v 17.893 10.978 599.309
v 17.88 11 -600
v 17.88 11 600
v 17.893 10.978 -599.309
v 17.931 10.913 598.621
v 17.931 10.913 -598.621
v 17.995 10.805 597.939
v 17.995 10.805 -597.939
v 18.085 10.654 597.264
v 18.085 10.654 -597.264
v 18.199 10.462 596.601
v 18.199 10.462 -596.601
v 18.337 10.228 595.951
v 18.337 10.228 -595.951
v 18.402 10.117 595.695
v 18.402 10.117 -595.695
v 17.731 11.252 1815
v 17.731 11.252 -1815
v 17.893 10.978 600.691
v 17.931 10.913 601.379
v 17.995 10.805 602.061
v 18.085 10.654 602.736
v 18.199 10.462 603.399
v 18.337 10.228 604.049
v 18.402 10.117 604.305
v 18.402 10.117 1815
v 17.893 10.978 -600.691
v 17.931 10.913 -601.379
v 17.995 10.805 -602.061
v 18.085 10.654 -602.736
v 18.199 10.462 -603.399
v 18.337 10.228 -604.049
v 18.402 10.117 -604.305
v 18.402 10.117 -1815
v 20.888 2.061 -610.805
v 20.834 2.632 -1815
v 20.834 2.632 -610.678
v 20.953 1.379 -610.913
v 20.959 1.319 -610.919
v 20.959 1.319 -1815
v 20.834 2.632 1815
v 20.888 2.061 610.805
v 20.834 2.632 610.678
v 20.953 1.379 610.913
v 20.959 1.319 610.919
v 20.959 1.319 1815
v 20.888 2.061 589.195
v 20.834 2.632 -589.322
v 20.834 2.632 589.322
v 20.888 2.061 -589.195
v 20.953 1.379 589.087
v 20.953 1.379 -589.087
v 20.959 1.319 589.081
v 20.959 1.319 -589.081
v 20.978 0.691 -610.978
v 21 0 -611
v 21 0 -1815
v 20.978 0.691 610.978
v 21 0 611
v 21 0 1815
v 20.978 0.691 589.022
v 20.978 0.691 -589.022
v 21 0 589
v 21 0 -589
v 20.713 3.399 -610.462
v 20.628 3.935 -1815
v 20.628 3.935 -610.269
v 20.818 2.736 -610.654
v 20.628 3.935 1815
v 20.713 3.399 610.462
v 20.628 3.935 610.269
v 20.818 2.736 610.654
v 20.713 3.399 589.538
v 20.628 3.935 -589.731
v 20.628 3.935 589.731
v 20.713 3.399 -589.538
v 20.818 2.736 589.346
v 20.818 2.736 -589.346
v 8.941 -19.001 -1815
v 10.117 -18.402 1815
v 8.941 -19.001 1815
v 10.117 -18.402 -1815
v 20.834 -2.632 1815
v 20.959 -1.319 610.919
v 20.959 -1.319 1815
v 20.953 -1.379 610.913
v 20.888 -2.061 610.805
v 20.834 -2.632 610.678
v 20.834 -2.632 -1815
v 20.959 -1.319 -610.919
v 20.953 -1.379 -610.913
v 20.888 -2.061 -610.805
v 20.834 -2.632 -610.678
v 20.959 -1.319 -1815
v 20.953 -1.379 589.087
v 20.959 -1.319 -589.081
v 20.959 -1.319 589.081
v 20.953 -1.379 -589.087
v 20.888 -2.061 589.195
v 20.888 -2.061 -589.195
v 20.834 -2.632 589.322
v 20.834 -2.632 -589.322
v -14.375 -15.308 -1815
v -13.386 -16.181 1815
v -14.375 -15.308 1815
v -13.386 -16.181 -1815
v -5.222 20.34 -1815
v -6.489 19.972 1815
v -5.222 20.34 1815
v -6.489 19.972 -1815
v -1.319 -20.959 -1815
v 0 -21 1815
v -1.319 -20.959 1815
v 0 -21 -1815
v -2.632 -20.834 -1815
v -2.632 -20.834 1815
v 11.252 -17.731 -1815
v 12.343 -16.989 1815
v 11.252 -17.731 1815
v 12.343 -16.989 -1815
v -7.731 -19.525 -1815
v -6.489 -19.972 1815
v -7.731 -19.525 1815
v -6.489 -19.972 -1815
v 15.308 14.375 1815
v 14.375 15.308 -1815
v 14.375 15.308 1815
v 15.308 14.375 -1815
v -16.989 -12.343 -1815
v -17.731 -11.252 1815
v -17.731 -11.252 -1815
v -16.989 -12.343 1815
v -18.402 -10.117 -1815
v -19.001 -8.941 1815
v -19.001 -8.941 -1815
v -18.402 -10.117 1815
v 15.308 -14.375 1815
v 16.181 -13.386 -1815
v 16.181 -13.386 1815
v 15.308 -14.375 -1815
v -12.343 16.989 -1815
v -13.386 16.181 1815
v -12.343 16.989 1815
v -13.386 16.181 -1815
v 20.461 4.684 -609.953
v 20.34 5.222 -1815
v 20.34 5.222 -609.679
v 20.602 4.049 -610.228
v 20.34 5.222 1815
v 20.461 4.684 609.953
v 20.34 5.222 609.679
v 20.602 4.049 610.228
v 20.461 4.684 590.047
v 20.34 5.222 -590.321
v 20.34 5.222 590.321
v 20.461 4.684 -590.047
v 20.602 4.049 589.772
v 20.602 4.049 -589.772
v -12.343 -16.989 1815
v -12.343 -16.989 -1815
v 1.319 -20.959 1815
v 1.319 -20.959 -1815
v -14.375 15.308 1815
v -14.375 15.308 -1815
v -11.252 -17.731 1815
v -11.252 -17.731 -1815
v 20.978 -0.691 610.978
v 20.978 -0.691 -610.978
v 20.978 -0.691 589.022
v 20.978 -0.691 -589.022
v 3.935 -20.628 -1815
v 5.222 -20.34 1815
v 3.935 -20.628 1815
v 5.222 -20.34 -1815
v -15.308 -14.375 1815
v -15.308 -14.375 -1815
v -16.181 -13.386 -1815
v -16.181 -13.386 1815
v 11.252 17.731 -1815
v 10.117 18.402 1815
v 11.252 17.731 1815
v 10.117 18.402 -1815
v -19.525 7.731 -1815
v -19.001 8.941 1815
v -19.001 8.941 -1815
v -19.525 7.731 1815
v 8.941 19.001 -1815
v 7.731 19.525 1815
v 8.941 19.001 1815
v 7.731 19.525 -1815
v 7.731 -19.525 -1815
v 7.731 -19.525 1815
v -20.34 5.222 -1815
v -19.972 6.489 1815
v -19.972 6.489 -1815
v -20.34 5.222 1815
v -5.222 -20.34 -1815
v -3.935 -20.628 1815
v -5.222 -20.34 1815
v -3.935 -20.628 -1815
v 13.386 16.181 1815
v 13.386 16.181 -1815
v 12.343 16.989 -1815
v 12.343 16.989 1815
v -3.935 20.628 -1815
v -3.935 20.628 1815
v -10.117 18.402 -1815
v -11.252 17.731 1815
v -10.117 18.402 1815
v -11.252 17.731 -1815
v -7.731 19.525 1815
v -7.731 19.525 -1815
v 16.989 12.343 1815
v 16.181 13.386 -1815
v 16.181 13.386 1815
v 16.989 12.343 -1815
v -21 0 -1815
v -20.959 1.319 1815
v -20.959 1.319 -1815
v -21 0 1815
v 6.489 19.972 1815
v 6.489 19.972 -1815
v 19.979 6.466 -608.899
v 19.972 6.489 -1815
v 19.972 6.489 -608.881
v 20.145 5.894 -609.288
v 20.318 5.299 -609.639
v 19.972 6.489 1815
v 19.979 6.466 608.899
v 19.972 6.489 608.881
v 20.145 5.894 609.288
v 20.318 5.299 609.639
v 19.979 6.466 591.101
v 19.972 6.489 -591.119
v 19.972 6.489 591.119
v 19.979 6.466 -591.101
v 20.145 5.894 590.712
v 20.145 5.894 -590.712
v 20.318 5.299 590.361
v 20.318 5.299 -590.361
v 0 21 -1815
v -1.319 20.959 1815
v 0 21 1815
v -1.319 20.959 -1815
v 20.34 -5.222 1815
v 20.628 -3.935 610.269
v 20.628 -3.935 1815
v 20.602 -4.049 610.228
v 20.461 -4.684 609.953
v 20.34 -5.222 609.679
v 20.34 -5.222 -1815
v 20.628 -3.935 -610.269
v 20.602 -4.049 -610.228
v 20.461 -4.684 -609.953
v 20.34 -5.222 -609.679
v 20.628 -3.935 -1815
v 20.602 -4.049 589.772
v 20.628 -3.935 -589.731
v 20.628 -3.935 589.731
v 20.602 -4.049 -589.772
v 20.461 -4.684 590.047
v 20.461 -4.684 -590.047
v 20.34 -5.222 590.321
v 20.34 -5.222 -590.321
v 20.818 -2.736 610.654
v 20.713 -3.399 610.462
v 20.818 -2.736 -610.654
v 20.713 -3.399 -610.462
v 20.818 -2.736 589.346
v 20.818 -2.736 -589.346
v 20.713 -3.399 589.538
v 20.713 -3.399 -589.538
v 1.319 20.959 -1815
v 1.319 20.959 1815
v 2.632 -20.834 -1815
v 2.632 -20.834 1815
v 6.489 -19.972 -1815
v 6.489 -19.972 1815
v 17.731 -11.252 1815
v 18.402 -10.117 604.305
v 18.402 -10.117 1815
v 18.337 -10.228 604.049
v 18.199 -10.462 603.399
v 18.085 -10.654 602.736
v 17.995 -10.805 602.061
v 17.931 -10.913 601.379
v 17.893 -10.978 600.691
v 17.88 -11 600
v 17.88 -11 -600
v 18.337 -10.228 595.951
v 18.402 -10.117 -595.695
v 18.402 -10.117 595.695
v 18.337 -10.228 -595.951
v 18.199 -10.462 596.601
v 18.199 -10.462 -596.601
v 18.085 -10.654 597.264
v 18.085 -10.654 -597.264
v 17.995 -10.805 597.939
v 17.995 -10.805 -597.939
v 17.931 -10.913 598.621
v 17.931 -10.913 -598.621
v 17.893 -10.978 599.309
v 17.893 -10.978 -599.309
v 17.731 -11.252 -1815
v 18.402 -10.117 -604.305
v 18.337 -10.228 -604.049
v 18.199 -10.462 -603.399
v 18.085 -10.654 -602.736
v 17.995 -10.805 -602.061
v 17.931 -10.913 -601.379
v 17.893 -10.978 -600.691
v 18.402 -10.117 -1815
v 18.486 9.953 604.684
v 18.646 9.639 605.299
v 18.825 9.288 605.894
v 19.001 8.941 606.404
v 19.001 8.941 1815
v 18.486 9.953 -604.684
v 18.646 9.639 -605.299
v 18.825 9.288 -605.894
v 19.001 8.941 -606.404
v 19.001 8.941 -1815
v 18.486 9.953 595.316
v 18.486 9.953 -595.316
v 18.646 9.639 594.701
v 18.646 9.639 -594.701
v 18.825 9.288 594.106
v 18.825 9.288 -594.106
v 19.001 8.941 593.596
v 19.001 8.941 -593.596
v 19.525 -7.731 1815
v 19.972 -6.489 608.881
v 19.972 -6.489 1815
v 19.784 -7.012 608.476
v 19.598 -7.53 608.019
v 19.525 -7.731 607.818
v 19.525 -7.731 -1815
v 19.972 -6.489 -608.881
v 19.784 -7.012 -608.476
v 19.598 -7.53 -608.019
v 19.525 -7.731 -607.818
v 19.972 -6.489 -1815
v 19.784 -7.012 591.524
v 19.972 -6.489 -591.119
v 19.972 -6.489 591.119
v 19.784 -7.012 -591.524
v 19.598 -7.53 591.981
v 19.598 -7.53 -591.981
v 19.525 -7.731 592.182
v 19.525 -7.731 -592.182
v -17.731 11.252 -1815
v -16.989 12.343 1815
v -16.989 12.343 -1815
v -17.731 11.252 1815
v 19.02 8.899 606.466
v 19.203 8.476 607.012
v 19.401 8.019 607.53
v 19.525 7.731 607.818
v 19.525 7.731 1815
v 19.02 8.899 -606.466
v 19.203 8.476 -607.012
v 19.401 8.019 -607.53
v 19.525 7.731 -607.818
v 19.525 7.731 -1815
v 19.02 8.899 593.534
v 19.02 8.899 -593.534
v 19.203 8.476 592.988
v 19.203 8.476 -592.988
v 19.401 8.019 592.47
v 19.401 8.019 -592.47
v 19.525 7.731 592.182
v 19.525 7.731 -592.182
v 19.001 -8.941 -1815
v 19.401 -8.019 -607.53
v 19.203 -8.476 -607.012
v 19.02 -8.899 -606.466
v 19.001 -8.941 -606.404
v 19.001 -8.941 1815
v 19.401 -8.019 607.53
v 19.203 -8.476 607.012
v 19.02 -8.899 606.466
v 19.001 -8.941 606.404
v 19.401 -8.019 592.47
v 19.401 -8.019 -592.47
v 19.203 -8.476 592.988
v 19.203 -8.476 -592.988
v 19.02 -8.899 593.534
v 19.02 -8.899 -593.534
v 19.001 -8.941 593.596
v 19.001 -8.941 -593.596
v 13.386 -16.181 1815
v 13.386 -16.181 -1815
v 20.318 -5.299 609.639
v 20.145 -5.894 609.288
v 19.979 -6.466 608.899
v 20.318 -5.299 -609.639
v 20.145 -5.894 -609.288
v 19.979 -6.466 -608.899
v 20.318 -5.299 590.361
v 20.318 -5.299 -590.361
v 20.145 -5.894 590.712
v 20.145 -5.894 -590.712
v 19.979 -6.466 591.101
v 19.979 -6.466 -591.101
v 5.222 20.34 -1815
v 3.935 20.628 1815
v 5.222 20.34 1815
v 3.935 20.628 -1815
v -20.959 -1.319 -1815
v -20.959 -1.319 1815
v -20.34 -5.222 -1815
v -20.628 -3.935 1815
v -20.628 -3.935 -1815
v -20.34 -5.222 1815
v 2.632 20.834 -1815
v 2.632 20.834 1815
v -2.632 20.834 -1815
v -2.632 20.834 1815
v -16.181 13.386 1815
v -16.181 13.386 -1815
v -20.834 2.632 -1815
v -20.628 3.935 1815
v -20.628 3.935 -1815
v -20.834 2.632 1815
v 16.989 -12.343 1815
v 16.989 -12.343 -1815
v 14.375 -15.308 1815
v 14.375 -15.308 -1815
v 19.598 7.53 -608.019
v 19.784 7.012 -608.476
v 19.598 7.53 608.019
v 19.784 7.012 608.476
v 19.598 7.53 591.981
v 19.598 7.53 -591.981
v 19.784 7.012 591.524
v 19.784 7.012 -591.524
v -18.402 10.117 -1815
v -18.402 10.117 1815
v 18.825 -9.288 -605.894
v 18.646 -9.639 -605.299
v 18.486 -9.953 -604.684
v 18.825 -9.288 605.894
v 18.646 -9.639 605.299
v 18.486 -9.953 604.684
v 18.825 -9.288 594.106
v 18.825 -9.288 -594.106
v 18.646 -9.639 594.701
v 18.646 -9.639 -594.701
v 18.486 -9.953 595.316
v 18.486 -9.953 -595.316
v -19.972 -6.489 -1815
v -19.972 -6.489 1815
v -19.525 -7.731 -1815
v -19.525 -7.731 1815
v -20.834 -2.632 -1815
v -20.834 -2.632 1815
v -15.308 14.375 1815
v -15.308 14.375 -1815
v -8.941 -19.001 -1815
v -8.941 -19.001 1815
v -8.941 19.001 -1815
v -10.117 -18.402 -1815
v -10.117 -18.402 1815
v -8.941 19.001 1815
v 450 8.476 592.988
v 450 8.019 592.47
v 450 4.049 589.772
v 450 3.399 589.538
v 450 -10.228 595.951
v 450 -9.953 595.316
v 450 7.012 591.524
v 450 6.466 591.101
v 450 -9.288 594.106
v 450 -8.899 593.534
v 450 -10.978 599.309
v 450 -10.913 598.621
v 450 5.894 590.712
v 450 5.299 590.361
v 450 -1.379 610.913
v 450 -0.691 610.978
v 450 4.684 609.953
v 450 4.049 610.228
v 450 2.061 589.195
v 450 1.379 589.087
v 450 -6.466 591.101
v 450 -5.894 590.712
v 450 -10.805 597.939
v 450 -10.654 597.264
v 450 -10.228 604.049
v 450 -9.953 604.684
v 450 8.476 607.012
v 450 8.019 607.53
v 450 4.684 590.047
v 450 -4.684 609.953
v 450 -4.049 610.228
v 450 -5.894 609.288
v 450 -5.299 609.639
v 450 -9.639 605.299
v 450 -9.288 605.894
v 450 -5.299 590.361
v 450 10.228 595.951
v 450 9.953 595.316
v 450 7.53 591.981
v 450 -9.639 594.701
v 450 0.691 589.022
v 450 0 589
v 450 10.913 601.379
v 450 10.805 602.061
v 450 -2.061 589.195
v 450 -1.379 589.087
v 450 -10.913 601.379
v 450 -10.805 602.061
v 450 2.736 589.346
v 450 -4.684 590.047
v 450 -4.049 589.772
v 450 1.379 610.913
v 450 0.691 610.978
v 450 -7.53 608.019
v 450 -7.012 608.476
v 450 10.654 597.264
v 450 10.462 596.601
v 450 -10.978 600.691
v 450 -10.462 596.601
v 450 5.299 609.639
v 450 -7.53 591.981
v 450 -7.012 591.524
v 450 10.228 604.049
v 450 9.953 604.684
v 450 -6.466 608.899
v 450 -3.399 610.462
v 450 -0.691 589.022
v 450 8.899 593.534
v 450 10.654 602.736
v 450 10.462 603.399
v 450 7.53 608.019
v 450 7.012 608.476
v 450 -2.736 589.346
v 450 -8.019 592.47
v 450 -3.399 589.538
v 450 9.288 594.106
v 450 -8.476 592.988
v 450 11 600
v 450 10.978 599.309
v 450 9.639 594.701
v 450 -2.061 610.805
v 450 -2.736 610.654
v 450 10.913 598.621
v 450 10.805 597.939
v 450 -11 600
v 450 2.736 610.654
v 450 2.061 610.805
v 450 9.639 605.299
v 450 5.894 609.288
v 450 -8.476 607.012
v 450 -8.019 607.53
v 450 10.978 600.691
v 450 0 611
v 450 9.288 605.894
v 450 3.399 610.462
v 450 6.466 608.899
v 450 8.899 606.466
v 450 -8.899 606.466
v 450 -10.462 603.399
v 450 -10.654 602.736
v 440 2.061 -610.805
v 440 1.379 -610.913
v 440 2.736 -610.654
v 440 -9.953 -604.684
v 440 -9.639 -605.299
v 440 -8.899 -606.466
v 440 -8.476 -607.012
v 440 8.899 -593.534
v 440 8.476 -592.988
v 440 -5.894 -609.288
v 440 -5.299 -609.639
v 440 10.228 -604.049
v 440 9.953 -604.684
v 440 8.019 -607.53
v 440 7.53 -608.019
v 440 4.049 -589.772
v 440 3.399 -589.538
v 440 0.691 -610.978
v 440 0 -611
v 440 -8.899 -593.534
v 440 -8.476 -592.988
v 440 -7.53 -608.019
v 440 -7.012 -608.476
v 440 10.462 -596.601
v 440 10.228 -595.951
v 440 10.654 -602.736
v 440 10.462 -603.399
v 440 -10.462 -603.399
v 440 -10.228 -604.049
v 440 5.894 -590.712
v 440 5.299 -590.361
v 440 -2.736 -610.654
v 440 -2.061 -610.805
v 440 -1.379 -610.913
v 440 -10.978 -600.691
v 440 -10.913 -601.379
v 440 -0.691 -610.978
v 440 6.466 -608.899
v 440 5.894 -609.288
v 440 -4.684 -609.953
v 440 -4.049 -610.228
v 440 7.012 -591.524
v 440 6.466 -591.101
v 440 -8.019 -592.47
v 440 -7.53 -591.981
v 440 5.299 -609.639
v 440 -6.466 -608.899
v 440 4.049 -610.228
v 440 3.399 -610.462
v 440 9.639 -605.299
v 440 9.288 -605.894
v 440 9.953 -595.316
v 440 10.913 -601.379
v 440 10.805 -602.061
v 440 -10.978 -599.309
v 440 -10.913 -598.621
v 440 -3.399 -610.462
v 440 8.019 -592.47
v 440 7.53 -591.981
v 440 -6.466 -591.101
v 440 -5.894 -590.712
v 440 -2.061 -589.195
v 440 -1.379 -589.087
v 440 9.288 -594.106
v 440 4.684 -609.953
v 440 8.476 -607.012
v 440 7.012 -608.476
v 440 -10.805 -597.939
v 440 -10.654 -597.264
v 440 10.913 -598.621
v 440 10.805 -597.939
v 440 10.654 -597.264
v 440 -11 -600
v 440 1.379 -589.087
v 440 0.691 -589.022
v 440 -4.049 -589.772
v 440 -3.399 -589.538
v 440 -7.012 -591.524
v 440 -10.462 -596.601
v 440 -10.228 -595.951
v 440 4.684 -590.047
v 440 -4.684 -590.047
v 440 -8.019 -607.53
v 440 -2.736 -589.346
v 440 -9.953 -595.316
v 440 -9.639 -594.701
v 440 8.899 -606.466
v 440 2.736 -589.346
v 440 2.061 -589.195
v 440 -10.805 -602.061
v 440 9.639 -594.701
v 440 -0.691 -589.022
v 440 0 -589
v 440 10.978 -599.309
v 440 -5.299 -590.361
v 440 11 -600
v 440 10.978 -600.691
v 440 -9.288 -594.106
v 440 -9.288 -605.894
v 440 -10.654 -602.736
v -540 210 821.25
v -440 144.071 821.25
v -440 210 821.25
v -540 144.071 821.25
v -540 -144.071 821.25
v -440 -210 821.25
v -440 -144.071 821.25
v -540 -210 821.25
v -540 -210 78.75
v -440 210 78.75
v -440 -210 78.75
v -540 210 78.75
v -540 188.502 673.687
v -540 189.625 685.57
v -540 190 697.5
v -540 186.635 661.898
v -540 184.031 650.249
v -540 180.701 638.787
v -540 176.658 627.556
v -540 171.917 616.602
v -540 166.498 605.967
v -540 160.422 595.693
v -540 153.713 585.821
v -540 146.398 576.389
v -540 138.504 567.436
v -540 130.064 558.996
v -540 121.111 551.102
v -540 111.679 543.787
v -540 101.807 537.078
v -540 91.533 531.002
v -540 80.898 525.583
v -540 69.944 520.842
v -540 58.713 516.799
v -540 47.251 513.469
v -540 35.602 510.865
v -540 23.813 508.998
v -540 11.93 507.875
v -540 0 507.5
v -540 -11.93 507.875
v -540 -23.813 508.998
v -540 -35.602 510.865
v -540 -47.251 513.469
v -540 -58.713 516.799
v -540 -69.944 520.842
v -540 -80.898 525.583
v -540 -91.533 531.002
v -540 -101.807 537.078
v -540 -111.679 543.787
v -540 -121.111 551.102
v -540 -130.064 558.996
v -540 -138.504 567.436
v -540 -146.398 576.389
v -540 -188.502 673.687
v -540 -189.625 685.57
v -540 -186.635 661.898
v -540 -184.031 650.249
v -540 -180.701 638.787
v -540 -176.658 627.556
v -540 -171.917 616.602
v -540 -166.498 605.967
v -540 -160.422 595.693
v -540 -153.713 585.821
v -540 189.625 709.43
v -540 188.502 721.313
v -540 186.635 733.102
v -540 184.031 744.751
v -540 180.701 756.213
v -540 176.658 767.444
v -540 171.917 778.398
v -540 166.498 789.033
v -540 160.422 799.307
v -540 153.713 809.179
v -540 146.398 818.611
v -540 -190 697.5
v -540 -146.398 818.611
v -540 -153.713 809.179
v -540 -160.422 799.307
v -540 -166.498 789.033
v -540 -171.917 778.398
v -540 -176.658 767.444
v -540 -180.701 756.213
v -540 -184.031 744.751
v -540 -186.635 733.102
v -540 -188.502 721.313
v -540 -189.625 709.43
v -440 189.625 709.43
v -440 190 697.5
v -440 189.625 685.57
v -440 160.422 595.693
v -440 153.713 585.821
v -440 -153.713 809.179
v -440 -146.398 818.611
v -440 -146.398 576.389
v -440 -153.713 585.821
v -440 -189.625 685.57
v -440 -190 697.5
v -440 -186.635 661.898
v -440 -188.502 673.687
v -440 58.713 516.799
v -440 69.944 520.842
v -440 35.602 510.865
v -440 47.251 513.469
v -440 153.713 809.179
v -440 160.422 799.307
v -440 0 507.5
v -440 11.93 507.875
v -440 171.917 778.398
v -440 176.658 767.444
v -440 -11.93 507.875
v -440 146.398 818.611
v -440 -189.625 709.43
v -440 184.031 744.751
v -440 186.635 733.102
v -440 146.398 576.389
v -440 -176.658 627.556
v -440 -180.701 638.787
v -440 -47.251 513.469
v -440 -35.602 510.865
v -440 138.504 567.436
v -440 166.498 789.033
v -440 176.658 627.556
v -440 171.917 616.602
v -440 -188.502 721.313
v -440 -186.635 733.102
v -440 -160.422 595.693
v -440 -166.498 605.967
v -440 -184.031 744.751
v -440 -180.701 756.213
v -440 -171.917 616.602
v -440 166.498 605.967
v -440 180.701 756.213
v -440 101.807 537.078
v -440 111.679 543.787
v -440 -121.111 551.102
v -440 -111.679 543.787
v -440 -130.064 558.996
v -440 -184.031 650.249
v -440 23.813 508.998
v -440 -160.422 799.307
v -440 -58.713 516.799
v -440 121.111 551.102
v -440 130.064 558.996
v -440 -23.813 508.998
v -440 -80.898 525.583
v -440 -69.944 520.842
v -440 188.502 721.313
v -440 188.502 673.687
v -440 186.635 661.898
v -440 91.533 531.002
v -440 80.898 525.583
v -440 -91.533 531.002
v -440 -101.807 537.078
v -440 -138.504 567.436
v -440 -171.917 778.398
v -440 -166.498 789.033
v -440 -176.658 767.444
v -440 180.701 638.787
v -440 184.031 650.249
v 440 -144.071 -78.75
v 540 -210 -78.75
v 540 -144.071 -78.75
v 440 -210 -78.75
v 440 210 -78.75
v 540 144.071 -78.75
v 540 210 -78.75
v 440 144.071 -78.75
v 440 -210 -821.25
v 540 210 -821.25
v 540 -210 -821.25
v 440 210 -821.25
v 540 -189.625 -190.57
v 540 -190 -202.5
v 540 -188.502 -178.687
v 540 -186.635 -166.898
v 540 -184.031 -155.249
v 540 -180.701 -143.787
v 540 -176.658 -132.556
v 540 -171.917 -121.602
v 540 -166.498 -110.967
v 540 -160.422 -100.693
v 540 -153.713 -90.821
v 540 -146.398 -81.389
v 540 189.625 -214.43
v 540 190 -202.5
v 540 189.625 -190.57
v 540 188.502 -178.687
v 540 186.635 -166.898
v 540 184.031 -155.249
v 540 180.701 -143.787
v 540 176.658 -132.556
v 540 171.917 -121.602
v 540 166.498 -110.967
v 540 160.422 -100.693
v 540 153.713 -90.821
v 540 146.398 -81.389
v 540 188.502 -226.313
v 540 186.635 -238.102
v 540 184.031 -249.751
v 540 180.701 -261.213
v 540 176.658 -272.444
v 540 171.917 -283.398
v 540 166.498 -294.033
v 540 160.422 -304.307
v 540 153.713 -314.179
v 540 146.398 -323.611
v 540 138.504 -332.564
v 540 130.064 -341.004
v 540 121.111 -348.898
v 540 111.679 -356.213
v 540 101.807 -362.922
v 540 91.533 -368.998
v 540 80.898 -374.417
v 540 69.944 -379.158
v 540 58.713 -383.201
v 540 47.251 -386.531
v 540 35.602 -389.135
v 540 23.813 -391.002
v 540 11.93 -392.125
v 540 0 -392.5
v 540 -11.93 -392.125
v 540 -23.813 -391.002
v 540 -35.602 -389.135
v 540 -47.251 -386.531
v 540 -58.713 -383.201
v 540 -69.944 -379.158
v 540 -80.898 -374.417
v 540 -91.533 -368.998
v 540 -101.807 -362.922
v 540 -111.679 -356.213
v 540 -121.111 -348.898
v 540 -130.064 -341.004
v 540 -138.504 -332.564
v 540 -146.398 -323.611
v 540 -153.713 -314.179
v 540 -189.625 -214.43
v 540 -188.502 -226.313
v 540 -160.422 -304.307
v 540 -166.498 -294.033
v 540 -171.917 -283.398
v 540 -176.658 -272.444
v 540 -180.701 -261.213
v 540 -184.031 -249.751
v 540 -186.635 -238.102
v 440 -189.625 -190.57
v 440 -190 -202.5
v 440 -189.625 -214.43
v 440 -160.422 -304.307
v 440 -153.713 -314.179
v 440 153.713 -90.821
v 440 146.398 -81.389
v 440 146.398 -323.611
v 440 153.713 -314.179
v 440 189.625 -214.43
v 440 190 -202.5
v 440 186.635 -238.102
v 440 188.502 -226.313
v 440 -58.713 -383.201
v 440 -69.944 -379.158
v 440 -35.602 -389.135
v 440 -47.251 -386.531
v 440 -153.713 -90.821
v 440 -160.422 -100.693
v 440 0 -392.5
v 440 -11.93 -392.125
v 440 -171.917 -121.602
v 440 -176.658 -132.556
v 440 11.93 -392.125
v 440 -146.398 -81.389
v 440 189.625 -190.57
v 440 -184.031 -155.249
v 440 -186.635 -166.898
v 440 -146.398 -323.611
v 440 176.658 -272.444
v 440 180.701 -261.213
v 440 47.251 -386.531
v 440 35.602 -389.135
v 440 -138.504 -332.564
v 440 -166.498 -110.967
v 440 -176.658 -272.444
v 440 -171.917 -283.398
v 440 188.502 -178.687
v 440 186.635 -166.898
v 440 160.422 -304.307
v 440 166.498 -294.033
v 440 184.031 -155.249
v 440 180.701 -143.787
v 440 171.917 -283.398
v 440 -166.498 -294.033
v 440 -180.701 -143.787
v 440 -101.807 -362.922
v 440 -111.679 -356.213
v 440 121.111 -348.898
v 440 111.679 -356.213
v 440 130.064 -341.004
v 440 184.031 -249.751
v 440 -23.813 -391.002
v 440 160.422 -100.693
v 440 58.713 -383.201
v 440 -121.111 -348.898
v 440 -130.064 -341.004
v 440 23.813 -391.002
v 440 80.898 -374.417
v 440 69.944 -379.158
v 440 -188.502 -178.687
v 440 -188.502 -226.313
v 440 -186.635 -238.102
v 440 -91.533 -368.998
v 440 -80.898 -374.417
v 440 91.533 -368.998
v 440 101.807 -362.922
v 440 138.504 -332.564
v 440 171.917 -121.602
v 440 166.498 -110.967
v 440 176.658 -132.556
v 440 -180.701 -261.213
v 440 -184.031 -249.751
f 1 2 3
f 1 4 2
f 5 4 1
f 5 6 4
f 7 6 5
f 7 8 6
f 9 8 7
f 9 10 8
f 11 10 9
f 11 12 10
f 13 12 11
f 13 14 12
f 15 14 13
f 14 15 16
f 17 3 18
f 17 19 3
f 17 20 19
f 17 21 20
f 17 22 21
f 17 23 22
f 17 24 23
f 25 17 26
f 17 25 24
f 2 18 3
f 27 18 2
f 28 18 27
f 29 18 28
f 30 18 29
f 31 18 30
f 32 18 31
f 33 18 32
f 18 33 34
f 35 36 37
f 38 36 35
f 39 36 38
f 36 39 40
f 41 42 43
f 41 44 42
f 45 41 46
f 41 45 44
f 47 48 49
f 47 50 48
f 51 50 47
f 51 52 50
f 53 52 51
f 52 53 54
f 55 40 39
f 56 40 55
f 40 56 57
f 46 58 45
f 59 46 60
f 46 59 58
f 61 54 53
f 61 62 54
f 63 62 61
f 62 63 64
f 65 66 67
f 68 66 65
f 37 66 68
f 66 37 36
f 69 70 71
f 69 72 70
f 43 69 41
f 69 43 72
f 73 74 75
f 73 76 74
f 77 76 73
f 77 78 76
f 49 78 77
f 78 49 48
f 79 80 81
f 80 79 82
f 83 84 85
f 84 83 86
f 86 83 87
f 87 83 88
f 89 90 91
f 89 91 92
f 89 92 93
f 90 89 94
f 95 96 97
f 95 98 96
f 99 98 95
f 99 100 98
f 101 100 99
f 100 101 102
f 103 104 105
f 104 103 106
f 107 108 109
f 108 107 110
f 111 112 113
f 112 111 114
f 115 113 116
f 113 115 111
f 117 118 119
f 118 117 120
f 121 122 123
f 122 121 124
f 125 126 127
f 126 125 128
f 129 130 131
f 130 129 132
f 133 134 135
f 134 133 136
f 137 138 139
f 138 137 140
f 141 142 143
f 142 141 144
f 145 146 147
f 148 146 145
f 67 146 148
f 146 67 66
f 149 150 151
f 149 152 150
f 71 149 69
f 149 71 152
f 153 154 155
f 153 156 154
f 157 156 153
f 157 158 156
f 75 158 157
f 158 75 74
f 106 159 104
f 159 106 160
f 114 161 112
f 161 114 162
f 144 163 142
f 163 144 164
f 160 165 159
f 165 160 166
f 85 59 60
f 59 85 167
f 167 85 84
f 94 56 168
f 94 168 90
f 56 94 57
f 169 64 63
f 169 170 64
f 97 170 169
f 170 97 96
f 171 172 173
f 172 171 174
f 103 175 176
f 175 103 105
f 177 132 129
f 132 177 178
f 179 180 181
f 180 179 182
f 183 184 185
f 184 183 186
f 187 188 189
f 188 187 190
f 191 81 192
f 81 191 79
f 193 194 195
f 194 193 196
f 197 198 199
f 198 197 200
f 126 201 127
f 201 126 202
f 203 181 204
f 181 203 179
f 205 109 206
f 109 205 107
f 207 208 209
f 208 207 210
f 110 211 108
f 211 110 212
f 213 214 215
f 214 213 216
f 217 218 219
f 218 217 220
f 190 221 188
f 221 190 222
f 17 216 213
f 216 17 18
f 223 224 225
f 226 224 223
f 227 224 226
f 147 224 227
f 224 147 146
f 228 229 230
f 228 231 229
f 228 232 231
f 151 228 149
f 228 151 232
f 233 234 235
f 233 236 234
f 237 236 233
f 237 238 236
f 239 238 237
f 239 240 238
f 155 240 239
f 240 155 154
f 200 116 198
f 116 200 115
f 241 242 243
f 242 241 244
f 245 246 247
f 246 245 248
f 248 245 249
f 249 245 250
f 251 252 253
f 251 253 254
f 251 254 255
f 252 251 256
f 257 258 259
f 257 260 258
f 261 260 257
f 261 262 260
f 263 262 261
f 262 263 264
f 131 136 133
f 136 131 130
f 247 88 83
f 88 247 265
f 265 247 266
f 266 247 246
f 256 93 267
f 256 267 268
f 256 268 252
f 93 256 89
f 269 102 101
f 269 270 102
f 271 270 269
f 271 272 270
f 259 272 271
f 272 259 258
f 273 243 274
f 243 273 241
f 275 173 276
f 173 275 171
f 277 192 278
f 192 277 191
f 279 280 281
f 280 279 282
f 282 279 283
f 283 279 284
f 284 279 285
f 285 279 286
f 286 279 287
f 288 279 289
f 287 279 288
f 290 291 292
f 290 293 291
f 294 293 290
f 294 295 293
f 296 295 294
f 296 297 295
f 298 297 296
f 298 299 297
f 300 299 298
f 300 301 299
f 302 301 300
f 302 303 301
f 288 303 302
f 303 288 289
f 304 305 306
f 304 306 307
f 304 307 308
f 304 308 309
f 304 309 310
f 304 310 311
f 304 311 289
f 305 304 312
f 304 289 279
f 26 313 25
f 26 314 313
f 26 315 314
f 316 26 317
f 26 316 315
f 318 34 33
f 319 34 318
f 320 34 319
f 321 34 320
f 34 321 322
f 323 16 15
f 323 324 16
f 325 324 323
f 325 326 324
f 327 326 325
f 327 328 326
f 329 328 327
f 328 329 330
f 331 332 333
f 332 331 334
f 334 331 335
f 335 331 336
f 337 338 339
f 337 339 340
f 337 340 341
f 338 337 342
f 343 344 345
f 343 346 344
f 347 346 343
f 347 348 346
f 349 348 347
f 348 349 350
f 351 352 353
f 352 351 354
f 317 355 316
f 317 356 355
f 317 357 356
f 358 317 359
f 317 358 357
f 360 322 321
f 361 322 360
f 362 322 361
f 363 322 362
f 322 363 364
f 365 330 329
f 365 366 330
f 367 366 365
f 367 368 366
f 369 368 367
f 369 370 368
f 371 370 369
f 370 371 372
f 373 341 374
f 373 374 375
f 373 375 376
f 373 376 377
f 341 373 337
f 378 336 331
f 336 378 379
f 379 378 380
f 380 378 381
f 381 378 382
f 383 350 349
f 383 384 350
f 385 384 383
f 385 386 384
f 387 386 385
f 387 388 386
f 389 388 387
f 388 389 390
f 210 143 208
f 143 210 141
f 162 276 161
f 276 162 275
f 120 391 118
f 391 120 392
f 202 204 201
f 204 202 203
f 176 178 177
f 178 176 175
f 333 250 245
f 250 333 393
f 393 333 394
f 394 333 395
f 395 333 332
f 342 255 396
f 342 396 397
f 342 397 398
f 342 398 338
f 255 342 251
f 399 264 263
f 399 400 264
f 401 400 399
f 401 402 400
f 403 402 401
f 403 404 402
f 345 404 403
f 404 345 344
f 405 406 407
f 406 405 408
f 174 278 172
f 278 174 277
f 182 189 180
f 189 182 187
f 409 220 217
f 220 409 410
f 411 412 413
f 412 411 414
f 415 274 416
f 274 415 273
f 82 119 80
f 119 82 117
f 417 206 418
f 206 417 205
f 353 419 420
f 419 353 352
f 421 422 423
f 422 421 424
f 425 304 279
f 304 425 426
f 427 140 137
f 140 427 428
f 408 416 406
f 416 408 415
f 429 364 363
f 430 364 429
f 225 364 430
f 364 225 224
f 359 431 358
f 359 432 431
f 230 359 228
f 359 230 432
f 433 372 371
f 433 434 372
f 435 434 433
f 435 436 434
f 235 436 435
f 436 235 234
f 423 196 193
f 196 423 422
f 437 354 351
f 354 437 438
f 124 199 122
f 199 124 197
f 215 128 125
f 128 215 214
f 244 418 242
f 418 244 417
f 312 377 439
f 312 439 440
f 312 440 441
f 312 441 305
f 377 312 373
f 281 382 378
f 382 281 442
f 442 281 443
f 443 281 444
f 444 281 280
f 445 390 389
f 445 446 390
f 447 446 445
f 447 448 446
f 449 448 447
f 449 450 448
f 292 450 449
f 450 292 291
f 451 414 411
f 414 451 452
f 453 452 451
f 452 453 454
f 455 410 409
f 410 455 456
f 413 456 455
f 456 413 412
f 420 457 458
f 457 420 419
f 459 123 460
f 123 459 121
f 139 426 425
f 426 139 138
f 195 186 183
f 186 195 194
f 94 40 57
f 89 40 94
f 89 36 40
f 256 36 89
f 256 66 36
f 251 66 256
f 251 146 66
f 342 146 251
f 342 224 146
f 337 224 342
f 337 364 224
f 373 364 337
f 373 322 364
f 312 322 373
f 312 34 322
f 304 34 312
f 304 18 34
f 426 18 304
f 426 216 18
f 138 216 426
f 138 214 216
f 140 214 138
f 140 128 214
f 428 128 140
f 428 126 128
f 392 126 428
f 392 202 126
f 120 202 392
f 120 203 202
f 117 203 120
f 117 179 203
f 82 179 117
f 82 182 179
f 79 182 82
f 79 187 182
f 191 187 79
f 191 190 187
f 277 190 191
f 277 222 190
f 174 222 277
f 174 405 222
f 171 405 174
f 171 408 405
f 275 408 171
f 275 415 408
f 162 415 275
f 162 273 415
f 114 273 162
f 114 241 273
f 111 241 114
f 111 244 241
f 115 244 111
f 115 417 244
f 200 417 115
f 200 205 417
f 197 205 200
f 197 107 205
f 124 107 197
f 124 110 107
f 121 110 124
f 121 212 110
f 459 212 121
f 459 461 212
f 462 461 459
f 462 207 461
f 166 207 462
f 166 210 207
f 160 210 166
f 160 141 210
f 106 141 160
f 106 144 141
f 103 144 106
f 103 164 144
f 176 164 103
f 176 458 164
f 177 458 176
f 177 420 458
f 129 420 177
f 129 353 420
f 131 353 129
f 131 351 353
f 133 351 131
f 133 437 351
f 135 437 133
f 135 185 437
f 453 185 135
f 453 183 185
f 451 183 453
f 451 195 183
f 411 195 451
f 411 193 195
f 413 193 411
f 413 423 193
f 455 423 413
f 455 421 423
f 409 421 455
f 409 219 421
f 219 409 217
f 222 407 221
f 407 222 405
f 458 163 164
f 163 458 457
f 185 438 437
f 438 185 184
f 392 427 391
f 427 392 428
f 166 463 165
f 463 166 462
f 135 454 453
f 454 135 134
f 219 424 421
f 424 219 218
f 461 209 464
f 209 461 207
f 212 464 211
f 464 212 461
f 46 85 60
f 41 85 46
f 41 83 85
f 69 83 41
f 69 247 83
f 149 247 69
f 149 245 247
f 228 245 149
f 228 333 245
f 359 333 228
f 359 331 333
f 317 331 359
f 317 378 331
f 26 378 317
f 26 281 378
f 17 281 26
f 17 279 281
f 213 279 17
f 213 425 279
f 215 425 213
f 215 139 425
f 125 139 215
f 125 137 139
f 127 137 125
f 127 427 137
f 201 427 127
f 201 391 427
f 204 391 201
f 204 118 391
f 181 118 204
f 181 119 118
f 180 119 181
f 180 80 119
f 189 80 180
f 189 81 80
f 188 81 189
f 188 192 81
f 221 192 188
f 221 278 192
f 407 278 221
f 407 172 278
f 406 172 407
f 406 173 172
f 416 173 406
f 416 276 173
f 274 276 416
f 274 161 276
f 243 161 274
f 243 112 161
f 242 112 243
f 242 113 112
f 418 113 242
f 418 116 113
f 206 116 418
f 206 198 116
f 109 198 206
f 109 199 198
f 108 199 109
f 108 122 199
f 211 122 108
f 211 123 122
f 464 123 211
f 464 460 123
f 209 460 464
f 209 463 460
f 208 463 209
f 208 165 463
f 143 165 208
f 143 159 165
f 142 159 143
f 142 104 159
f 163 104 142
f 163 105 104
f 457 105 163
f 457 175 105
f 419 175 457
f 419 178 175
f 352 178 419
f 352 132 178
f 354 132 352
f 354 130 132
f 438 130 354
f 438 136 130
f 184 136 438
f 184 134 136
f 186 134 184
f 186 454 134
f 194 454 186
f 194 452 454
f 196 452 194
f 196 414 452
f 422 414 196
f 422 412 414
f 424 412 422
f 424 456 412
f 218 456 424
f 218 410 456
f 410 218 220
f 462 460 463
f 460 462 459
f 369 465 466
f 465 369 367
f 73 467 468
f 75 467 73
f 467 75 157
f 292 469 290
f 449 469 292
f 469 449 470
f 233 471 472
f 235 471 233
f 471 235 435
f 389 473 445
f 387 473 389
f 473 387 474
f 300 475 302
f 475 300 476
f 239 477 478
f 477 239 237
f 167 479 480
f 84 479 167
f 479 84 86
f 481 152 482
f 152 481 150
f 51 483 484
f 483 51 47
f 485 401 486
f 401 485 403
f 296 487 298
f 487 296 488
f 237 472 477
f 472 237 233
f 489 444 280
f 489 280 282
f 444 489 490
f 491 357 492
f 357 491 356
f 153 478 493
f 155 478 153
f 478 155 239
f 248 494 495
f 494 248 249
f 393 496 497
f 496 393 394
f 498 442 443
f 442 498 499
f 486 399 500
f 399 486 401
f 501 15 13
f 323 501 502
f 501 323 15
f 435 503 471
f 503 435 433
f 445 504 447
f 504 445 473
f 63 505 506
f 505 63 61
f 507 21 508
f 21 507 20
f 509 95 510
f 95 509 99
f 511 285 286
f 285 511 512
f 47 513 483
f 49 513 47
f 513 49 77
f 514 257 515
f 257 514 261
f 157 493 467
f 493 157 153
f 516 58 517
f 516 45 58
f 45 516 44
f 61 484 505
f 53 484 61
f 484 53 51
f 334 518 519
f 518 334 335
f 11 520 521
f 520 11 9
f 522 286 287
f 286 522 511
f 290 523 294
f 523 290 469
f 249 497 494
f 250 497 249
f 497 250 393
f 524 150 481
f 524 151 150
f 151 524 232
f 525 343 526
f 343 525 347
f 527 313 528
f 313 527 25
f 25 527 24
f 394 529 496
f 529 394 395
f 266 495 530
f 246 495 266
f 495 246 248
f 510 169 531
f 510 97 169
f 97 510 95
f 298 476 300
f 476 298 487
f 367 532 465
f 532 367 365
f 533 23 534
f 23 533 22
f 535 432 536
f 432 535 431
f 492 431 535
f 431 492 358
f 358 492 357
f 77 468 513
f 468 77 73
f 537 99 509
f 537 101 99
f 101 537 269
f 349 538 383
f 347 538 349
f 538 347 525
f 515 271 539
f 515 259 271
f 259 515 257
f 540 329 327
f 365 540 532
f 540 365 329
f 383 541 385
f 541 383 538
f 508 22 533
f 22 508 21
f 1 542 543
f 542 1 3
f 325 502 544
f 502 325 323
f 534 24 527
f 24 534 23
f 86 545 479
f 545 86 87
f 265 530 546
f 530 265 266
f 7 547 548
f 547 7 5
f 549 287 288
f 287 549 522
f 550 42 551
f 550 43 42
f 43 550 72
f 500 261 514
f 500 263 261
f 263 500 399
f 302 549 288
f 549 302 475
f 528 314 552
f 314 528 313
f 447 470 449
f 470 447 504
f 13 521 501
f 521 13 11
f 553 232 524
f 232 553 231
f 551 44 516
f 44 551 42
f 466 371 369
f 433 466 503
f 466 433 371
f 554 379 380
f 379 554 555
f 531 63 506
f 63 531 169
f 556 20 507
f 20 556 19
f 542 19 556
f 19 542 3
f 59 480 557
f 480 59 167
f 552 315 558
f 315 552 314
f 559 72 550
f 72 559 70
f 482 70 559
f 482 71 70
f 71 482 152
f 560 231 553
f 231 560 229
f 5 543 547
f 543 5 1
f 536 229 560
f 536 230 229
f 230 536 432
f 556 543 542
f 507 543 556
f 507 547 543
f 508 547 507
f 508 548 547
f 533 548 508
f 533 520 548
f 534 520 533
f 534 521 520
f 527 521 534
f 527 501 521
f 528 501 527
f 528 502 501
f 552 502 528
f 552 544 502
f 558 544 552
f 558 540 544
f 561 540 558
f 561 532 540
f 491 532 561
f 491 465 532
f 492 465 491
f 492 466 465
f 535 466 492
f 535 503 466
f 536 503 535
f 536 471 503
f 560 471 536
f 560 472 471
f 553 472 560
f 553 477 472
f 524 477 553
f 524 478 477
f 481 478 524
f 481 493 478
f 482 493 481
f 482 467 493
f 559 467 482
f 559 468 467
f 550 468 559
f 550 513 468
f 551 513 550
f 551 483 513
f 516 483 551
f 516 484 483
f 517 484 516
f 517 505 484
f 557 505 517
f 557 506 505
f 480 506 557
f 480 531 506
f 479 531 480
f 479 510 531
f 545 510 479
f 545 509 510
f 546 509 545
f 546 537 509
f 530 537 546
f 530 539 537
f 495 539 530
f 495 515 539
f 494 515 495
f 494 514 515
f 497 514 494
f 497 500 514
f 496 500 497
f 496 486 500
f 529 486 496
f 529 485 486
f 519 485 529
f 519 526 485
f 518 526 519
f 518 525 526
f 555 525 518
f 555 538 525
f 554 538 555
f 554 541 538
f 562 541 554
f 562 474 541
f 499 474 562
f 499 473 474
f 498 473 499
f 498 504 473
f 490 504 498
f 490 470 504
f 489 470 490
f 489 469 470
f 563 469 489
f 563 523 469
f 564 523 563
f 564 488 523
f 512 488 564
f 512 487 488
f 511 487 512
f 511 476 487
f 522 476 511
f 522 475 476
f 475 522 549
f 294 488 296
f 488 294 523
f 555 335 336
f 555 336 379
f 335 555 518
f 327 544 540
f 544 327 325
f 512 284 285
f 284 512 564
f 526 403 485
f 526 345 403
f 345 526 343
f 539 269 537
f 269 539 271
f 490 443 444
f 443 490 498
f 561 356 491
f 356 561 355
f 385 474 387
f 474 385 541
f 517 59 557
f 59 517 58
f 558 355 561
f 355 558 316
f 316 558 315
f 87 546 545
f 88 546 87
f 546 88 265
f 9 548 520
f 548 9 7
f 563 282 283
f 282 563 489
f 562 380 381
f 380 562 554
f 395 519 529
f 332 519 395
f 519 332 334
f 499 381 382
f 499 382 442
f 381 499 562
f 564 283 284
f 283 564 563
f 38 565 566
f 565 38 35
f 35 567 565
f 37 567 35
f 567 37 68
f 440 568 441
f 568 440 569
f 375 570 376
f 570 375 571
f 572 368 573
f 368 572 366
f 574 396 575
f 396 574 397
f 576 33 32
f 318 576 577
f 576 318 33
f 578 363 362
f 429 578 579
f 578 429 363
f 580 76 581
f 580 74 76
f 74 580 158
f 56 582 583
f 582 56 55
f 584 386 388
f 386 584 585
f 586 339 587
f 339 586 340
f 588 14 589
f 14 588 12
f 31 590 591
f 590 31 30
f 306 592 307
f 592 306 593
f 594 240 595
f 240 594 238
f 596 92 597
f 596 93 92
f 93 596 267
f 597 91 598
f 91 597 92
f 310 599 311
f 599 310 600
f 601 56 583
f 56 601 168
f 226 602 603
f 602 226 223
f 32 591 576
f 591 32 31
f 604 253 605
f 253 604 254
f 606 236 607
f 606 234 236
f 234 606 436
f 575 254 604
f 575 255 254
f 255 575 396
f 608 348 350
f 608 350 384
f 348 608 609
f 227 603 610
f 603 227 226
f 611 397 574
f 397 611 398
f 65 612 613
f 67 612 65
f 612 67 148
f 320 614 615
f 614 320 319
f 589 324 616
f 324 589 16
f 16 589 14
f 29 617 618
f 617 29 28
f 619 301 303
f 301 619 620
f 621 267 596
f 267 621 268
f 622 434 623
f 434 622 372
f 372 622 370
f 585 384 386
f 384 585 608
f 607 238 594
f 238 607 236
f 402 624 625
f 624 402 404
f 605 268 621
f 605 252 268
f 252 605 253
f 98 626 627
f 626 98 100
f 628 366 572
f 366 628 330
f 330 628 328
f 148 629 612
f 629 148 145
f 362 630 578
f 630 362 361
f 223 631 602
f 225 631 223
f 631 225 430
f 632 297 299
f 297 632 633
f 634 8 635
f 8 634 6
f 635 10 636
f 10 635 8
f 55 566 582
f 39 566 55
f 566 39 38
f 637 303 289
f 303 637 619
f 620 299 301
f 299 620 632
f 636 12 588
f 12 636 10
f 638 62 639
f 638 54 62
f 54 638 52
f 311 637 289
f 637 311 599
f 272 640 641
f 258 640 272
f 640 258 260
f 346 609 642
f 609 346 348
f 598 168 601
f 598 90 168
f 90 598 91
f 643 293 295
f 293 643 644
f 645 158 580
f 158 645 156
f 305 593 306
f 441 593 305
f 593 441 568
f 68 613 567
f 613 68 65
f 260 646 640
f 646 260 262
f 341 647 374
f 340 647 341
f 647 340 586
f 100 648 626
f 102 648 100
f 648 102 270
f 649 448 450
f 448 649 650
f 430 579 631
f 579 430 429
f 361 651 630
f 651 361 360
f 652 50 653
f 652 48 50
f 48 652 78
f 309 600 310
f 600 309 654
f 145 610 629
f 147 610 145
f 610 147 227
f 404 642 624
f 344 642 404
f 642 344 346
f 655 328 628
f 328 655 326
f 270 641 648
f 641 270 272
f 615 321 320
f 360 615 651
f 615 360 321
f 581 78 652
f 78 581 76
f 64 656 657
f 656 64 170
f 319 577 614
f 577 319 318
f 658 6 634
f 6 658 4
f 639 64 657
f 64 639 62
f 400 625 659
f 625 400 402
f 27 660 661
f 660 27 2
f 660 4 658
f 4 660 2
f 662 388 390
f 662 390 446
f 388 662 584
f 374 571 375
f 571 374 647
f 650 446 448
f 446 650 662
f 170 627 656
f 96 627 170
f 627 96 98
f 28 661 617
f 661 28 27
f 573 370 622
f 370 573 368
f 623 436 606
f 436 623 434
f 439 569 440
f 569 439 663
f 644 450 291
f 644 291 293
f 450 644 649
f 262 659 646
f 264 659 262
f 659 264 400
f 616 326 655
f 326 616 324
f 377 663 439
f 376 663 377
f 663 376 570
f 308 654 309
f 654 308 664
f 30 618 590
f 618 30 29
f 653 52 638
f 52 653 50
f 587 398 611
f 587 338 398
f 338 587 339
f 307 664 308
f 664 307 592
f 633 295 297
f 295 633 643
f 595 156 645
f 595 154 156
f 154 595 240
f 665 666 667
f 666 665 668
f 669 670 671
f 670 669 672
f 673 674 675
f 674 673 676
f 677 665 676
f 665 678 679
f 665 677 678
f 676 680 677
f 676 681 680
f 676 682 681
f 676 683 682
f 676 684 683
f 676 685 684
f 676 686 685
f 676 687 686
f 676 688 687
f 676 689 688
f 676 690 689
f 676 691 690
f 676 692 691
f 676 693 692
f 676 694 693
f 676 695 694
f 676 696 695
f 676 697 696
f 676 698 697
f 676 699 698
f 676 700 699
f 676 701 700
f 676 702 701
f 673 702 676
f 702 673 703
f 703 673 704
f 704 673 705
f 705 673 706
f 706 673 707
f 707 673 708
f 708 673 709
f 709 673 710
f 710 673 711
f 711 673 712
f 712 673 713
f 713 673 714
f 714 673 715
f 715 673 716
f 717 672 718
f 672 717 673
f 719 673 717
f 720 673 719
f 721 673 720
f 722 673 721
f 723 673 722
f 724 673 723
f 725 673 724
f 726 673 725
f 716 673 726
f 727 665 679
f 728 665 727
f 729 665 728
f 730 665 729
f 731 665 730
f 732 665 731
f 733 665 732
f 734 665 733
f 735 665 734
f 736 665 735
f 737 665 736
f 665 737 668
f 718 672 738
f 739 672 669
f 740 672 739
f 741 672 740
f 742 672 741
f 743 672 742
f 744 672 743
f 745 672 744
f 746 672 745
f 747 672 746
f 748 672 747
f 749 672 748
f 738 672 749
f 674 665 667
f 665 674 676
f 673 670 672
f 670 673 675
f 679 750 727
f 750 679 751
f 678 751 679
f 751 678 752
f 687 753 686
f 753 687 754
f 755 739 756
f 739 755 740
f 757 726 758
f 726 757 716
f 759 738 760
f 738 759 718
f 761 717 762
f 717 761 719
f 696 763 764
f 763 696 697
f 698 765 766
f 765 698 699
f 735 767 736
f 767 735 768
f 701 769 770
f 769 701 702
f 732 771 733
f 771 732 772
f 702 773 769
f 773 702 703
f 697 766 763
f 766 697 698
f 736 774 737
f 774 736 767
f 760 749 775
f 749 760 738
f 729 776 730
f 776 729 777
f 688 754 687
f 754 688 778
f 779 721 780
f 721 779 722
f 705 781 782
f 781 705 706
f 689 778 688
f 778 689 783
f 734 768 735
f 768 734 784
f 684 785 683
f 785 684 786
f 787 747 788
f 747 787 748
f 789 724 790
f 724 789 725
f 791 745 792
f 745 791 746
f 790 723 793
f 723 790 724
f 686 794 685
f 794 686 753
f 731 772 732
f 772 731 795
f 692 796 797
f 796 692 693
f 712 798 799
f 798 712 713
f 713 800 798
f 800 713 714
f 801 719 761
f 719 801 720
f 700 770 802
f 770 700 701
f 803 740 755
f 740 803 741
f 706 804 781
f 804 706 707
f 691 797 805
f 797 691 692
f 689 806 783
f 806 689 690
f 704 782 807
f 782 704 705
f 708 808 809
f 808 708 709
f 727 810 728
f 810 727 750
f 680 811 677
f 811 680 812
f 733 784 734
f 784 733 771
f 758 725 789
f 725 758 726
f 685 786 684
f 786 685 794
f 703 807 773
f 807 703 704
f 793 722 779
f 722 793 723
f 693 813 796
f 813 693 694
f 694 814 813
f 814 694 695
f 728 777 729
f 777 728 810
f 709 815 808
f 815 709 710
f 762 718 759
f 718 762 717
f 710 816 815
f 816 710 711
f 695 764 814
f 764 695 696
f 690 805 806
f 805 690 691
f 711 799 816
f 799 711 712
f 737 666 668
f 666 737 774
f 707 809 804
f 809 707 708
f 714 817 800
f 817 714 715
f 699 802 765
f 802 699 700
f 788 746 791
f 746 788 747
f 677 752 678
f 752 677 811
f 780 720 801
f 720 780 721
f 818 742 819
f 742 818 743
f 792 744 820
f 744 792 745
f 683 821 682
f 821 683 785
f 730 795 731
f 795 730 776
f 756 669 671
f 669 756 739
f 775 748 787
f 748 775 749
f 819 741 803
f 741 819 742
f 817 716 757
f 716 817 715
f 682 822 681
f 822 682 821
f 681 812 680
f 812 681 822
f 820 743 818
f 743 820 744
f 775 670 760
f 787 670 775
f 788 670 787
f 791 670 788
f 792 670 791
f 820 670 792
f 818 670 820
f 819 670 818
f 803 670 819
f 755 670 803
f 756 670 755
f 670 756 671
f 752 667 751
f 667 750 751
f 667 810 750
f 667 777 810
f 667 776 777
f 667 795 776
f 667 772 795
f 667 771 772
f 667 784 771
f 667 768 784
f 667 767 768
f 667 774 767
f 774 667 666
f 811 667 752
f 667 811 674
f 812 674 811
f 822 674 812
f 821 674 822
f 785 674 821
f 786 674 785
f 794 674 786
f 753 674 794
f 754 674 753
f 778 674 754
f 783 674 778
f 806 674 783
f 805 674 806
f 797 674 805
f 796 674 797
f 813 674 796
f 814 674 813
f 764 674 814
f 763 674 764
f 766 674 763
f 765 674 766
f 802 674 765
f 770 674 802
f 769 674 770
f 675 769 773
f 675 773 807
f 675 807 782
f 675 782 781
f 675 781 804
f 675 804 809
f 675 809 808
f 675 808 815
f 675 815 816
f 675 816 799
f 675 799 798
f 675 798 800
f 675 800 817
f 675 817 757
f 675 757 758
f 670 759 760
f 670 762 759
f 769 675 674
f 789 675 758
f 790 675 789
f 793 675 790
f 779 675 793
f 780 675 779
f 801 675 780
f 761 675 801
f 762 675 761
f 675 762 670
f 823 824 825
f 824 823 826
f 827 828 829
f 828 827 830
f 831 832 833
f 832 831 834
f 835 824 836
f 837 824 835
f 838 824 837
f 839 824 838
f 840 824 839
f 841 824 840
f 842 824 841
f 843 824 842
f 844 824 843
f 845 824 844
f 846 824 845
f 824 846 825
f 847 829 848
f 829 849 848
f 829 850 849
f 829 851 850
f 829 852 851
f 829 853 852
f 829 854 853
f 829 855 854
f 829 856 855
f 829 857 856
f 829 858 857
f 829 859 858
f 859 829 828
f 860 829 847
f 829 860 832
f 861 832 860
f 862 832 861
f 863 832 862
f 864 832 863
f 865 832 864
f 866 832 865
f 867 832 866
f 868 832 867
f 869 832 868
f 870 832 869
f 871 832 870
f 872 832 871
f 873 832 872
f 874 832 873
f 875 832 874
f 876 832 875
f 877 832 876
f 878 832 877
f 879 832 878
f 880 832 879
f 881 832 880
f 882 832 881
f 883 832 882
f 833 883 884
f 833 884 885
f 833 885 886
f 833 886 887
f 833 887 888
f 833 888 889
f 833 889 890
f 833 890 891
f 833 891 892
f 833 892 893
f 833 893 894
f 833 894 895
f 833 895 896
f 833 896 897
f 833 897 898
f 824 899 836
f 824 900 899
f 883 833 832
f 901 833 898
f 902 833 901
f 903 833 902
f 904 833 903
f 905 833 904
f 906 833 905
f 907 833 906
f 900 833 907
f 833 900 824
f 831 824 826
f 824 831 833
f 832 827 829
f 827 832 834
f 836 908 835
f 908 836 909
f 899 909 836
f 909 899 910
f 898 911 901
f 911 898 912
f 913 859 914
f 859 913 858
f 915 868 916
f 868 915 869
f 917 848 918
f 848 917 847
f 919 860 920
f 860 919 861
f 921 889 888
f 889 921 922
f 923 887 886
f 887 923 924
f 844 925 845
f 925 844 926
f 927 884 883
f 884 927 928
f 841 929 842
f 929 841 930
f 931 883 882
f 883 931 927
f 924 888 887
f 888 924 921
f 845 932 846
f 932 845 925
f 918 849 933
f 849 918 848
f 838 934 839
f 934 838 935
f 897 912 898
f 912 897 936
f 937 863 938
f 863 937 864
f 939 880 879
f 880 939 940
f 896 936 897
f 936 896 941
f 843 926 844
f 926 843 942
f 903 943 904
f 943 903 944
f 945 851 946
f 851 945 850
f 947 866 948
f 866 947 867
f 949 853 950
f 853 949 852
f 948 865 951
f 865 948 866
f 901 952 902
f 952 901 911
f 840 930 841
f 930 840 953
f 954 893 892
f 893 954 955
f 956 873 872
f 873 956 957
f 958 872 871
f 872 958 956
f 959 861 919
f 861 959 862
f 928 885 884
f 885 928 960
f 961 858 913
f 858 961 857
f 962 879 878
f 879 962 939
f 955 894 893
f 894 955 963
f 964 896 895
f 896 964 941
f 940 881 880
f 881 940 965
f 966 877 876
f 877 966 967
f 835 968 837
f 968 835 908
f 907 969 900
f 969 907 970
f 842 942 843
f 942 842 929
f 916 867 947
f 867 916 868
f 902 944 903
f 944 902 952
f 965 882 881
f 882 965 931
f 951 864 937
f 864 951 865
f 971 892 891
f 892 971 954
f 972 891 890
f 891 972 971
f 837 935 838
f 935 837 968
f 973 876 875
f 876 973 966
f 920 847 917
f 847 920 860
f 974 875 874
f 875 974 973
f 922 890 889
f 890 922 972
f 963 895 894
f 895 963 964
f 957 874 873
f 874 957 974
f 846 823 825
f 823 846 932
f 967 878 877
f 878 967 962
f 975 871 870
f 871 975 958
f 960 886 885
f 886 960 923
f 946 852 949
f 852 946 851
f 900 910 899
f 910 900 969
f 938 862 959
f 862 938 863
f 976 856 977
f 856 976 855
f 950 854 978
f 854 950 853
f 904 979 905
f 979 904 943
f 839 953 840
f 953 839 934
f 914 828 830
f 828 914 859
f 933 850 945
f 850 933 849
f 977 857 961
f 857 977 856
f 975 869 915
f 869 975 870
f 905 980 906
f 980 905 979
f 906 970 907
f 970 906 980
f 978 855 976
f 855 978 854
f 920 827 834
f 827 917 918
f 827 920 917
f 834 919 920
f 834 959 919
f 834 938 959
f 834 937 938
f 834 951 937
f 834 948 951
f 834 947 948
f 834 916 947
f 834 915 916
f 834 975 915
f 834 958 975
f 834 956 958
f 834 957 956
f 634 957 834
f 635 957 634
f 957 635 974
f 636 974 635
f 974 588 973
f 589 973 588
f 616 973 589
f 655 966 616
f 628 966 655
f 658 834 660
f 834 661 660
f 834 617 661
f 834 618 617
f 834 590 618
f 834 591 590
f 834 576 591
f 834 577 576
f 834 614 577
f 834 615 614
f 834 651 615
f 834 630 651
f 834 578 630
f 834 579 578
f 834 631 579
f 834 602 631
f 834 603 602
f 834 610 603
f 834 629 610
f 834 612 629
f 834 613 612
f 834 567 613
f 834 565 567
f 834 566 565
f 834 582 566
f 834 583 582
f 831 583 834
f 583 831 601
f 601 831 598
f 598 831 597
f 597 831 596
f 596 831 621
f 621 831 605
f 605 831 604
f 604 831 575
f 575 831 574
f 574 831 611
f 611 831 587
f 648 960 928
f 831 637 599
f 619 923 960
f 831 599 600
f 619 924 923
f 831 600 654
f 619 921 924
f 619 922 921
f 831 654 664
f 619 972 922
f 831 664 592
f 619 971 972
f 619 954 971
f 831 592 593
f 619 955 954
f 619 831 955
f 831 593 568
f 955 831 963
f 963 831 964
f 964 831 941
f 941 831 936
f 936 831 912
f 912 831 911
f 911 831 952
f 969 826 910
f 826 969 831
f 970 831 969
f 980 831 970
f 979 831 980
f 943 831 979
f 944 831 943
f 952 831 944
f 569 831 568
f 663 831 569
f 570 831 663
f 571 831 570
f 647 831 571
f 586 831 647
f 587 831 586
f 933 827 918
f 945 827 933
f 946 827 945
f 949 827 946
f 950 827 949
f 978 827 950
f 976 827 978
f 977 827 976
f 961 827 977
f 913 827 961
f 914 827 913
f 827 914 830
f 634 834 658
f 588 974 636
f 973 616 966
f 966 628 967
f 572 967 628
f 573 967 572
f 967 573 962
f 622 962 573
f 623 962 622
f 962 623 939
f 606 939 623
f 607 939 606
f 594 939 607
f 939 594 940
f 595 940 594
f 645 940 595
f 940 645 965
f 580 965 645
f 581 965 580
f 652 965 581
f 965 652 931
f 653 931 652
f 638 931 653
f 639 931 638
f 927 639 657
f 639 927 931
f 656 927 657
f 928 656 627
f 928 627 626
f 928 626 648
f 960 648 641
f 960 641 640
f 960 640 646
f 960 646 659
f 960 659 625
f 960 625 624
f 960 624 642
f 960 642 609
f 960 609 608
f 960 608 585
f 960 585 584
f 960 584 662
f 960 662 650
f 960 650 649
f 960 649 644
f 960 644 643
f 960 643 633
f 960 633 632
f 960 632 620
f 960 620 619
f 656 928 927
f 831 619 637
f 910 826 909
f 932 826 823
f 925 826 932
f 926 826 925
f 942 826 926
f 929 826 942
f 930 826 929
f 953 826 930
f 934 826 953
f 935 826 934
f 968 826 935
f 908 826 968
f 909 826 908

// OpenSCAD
// ============================================================================
// PROJECT: XXXG-00W0 WING GUNDAM ZERO EW - AIRFRAME STRUCTURAL BACKBONE
// COMPONENT VAULT: BANDAI CAST RUNNER G - SPINAL CONNECTORS G14 & G15
// MANUFACTURING SPECS: SOLID-STATE CAST-IN POWER RAILS FOR SQUARE-WAVE BUS
// ENGINEERING PARITY: SHIELDING CORES FOR 22-G VERTICAL BOOSTER ROCKET LAUNCH
// ============================================================================

$fn = 100; // Circular segment resolution calculation count

// Sizing Constants Scaled 1:1 for a 16.7-Meter Airframe Scale (mm)
spinal_bar_height = 1650;               // Total vertical backbone length (mm)
mounting_bracket_bore = 380;            // Main core pivot fastener diameter (mm)
armor_shield_wall = 85;                 // Heavy solid TiAl reinforcing plate thickness (mm)
harness_conduit_width = 80;             // Cast-in 4oz copper logic trace track (mm)

module Runner_G_Spine_Forge() {
    // Central Supply Injection Runner Axis (Molten Feed Line from Siphon Forge)
    color([0.22, 0.22, 0.25]) {
        cylinder(h = spinal_bar_height * 2.2, d = 42, center = true);
        // Direct injection gates tracking straight into the part mold cavities
        translate([0, 0, 600]) rotate([0, 90, 0]) cylinder(h = 450, d = 22);
        translate([0, 0, -600]) rotate([0, 90, 0]) cylinder(h = 450, d = 22);
    }
    
    // Instantiate Scaled Structural Molds Symmetrically (Left & Right Halves)
    Cast_Spinal_Backbone_Components();
}

module Cast_Spinal_Backbone_Components() {
    // ---- PART G14: INTERNAL LEFT SPINAL CONNECTOR BAR ---- [Page 18, Step 10-5]
    translate([-400, 0, 450]) color([0.35, 0.35, 0.38]) { // Inner Frame Gunmetal Spec
        difference() {
            // Main solid high-strength upper back spinal brace block
            cube([280, 420, spinal_bar_height * 0.45], center = true);
            
            // Integrated Multi-Axis Core Tracking Linkage Pivot Bore
            translate([0, 0, (spinal_bar_height * 0.15)])
                rotate([0, 90, 0])
                    cylinder(h = 300, d = mounting_bracket_bore, center = true);
            
            // Continuous cast-in routing track for the 4oz solid-state wiring rails
            cube([harness_conduit_width, 420 + 10, spinal_bar_height], center = true);
            
            // Slicing profile tool to generate an asymmetrical half-shell mating part
            translate([200, 0, 0])
                cube([400, 500, spinal_bar_height], center = true);
        }
    }
    
    // ---- PART G15: INTERNAL RIGHT SPINAL CONNECTOR BAR ---- [Page 18, Step 10-5]
    translate([400, 0, -450]) rotate([0, 0, 180]) color([0.35, 0.35, 0.38]) {
        difference() {
            cube([280, 420, spinal_bar_height * 0.45], center = true);
            translate([0, 0, (spinal_bar_height * 0.15)])
                rotate([0, 90, 0])
                    cylinder(h = 300, d = mounting_bracket_bore, center = true);
            cube([harness_conduit_width, 420 + 10, spinal_bar_height], center = true);
            translate([200, 0, 0])
                cube([400, 500, spinal_bar_height], center = true);
        }
    }
}

// Render Master Assembly to Parameter Workspace
Runner_G_Spine_Forge();
